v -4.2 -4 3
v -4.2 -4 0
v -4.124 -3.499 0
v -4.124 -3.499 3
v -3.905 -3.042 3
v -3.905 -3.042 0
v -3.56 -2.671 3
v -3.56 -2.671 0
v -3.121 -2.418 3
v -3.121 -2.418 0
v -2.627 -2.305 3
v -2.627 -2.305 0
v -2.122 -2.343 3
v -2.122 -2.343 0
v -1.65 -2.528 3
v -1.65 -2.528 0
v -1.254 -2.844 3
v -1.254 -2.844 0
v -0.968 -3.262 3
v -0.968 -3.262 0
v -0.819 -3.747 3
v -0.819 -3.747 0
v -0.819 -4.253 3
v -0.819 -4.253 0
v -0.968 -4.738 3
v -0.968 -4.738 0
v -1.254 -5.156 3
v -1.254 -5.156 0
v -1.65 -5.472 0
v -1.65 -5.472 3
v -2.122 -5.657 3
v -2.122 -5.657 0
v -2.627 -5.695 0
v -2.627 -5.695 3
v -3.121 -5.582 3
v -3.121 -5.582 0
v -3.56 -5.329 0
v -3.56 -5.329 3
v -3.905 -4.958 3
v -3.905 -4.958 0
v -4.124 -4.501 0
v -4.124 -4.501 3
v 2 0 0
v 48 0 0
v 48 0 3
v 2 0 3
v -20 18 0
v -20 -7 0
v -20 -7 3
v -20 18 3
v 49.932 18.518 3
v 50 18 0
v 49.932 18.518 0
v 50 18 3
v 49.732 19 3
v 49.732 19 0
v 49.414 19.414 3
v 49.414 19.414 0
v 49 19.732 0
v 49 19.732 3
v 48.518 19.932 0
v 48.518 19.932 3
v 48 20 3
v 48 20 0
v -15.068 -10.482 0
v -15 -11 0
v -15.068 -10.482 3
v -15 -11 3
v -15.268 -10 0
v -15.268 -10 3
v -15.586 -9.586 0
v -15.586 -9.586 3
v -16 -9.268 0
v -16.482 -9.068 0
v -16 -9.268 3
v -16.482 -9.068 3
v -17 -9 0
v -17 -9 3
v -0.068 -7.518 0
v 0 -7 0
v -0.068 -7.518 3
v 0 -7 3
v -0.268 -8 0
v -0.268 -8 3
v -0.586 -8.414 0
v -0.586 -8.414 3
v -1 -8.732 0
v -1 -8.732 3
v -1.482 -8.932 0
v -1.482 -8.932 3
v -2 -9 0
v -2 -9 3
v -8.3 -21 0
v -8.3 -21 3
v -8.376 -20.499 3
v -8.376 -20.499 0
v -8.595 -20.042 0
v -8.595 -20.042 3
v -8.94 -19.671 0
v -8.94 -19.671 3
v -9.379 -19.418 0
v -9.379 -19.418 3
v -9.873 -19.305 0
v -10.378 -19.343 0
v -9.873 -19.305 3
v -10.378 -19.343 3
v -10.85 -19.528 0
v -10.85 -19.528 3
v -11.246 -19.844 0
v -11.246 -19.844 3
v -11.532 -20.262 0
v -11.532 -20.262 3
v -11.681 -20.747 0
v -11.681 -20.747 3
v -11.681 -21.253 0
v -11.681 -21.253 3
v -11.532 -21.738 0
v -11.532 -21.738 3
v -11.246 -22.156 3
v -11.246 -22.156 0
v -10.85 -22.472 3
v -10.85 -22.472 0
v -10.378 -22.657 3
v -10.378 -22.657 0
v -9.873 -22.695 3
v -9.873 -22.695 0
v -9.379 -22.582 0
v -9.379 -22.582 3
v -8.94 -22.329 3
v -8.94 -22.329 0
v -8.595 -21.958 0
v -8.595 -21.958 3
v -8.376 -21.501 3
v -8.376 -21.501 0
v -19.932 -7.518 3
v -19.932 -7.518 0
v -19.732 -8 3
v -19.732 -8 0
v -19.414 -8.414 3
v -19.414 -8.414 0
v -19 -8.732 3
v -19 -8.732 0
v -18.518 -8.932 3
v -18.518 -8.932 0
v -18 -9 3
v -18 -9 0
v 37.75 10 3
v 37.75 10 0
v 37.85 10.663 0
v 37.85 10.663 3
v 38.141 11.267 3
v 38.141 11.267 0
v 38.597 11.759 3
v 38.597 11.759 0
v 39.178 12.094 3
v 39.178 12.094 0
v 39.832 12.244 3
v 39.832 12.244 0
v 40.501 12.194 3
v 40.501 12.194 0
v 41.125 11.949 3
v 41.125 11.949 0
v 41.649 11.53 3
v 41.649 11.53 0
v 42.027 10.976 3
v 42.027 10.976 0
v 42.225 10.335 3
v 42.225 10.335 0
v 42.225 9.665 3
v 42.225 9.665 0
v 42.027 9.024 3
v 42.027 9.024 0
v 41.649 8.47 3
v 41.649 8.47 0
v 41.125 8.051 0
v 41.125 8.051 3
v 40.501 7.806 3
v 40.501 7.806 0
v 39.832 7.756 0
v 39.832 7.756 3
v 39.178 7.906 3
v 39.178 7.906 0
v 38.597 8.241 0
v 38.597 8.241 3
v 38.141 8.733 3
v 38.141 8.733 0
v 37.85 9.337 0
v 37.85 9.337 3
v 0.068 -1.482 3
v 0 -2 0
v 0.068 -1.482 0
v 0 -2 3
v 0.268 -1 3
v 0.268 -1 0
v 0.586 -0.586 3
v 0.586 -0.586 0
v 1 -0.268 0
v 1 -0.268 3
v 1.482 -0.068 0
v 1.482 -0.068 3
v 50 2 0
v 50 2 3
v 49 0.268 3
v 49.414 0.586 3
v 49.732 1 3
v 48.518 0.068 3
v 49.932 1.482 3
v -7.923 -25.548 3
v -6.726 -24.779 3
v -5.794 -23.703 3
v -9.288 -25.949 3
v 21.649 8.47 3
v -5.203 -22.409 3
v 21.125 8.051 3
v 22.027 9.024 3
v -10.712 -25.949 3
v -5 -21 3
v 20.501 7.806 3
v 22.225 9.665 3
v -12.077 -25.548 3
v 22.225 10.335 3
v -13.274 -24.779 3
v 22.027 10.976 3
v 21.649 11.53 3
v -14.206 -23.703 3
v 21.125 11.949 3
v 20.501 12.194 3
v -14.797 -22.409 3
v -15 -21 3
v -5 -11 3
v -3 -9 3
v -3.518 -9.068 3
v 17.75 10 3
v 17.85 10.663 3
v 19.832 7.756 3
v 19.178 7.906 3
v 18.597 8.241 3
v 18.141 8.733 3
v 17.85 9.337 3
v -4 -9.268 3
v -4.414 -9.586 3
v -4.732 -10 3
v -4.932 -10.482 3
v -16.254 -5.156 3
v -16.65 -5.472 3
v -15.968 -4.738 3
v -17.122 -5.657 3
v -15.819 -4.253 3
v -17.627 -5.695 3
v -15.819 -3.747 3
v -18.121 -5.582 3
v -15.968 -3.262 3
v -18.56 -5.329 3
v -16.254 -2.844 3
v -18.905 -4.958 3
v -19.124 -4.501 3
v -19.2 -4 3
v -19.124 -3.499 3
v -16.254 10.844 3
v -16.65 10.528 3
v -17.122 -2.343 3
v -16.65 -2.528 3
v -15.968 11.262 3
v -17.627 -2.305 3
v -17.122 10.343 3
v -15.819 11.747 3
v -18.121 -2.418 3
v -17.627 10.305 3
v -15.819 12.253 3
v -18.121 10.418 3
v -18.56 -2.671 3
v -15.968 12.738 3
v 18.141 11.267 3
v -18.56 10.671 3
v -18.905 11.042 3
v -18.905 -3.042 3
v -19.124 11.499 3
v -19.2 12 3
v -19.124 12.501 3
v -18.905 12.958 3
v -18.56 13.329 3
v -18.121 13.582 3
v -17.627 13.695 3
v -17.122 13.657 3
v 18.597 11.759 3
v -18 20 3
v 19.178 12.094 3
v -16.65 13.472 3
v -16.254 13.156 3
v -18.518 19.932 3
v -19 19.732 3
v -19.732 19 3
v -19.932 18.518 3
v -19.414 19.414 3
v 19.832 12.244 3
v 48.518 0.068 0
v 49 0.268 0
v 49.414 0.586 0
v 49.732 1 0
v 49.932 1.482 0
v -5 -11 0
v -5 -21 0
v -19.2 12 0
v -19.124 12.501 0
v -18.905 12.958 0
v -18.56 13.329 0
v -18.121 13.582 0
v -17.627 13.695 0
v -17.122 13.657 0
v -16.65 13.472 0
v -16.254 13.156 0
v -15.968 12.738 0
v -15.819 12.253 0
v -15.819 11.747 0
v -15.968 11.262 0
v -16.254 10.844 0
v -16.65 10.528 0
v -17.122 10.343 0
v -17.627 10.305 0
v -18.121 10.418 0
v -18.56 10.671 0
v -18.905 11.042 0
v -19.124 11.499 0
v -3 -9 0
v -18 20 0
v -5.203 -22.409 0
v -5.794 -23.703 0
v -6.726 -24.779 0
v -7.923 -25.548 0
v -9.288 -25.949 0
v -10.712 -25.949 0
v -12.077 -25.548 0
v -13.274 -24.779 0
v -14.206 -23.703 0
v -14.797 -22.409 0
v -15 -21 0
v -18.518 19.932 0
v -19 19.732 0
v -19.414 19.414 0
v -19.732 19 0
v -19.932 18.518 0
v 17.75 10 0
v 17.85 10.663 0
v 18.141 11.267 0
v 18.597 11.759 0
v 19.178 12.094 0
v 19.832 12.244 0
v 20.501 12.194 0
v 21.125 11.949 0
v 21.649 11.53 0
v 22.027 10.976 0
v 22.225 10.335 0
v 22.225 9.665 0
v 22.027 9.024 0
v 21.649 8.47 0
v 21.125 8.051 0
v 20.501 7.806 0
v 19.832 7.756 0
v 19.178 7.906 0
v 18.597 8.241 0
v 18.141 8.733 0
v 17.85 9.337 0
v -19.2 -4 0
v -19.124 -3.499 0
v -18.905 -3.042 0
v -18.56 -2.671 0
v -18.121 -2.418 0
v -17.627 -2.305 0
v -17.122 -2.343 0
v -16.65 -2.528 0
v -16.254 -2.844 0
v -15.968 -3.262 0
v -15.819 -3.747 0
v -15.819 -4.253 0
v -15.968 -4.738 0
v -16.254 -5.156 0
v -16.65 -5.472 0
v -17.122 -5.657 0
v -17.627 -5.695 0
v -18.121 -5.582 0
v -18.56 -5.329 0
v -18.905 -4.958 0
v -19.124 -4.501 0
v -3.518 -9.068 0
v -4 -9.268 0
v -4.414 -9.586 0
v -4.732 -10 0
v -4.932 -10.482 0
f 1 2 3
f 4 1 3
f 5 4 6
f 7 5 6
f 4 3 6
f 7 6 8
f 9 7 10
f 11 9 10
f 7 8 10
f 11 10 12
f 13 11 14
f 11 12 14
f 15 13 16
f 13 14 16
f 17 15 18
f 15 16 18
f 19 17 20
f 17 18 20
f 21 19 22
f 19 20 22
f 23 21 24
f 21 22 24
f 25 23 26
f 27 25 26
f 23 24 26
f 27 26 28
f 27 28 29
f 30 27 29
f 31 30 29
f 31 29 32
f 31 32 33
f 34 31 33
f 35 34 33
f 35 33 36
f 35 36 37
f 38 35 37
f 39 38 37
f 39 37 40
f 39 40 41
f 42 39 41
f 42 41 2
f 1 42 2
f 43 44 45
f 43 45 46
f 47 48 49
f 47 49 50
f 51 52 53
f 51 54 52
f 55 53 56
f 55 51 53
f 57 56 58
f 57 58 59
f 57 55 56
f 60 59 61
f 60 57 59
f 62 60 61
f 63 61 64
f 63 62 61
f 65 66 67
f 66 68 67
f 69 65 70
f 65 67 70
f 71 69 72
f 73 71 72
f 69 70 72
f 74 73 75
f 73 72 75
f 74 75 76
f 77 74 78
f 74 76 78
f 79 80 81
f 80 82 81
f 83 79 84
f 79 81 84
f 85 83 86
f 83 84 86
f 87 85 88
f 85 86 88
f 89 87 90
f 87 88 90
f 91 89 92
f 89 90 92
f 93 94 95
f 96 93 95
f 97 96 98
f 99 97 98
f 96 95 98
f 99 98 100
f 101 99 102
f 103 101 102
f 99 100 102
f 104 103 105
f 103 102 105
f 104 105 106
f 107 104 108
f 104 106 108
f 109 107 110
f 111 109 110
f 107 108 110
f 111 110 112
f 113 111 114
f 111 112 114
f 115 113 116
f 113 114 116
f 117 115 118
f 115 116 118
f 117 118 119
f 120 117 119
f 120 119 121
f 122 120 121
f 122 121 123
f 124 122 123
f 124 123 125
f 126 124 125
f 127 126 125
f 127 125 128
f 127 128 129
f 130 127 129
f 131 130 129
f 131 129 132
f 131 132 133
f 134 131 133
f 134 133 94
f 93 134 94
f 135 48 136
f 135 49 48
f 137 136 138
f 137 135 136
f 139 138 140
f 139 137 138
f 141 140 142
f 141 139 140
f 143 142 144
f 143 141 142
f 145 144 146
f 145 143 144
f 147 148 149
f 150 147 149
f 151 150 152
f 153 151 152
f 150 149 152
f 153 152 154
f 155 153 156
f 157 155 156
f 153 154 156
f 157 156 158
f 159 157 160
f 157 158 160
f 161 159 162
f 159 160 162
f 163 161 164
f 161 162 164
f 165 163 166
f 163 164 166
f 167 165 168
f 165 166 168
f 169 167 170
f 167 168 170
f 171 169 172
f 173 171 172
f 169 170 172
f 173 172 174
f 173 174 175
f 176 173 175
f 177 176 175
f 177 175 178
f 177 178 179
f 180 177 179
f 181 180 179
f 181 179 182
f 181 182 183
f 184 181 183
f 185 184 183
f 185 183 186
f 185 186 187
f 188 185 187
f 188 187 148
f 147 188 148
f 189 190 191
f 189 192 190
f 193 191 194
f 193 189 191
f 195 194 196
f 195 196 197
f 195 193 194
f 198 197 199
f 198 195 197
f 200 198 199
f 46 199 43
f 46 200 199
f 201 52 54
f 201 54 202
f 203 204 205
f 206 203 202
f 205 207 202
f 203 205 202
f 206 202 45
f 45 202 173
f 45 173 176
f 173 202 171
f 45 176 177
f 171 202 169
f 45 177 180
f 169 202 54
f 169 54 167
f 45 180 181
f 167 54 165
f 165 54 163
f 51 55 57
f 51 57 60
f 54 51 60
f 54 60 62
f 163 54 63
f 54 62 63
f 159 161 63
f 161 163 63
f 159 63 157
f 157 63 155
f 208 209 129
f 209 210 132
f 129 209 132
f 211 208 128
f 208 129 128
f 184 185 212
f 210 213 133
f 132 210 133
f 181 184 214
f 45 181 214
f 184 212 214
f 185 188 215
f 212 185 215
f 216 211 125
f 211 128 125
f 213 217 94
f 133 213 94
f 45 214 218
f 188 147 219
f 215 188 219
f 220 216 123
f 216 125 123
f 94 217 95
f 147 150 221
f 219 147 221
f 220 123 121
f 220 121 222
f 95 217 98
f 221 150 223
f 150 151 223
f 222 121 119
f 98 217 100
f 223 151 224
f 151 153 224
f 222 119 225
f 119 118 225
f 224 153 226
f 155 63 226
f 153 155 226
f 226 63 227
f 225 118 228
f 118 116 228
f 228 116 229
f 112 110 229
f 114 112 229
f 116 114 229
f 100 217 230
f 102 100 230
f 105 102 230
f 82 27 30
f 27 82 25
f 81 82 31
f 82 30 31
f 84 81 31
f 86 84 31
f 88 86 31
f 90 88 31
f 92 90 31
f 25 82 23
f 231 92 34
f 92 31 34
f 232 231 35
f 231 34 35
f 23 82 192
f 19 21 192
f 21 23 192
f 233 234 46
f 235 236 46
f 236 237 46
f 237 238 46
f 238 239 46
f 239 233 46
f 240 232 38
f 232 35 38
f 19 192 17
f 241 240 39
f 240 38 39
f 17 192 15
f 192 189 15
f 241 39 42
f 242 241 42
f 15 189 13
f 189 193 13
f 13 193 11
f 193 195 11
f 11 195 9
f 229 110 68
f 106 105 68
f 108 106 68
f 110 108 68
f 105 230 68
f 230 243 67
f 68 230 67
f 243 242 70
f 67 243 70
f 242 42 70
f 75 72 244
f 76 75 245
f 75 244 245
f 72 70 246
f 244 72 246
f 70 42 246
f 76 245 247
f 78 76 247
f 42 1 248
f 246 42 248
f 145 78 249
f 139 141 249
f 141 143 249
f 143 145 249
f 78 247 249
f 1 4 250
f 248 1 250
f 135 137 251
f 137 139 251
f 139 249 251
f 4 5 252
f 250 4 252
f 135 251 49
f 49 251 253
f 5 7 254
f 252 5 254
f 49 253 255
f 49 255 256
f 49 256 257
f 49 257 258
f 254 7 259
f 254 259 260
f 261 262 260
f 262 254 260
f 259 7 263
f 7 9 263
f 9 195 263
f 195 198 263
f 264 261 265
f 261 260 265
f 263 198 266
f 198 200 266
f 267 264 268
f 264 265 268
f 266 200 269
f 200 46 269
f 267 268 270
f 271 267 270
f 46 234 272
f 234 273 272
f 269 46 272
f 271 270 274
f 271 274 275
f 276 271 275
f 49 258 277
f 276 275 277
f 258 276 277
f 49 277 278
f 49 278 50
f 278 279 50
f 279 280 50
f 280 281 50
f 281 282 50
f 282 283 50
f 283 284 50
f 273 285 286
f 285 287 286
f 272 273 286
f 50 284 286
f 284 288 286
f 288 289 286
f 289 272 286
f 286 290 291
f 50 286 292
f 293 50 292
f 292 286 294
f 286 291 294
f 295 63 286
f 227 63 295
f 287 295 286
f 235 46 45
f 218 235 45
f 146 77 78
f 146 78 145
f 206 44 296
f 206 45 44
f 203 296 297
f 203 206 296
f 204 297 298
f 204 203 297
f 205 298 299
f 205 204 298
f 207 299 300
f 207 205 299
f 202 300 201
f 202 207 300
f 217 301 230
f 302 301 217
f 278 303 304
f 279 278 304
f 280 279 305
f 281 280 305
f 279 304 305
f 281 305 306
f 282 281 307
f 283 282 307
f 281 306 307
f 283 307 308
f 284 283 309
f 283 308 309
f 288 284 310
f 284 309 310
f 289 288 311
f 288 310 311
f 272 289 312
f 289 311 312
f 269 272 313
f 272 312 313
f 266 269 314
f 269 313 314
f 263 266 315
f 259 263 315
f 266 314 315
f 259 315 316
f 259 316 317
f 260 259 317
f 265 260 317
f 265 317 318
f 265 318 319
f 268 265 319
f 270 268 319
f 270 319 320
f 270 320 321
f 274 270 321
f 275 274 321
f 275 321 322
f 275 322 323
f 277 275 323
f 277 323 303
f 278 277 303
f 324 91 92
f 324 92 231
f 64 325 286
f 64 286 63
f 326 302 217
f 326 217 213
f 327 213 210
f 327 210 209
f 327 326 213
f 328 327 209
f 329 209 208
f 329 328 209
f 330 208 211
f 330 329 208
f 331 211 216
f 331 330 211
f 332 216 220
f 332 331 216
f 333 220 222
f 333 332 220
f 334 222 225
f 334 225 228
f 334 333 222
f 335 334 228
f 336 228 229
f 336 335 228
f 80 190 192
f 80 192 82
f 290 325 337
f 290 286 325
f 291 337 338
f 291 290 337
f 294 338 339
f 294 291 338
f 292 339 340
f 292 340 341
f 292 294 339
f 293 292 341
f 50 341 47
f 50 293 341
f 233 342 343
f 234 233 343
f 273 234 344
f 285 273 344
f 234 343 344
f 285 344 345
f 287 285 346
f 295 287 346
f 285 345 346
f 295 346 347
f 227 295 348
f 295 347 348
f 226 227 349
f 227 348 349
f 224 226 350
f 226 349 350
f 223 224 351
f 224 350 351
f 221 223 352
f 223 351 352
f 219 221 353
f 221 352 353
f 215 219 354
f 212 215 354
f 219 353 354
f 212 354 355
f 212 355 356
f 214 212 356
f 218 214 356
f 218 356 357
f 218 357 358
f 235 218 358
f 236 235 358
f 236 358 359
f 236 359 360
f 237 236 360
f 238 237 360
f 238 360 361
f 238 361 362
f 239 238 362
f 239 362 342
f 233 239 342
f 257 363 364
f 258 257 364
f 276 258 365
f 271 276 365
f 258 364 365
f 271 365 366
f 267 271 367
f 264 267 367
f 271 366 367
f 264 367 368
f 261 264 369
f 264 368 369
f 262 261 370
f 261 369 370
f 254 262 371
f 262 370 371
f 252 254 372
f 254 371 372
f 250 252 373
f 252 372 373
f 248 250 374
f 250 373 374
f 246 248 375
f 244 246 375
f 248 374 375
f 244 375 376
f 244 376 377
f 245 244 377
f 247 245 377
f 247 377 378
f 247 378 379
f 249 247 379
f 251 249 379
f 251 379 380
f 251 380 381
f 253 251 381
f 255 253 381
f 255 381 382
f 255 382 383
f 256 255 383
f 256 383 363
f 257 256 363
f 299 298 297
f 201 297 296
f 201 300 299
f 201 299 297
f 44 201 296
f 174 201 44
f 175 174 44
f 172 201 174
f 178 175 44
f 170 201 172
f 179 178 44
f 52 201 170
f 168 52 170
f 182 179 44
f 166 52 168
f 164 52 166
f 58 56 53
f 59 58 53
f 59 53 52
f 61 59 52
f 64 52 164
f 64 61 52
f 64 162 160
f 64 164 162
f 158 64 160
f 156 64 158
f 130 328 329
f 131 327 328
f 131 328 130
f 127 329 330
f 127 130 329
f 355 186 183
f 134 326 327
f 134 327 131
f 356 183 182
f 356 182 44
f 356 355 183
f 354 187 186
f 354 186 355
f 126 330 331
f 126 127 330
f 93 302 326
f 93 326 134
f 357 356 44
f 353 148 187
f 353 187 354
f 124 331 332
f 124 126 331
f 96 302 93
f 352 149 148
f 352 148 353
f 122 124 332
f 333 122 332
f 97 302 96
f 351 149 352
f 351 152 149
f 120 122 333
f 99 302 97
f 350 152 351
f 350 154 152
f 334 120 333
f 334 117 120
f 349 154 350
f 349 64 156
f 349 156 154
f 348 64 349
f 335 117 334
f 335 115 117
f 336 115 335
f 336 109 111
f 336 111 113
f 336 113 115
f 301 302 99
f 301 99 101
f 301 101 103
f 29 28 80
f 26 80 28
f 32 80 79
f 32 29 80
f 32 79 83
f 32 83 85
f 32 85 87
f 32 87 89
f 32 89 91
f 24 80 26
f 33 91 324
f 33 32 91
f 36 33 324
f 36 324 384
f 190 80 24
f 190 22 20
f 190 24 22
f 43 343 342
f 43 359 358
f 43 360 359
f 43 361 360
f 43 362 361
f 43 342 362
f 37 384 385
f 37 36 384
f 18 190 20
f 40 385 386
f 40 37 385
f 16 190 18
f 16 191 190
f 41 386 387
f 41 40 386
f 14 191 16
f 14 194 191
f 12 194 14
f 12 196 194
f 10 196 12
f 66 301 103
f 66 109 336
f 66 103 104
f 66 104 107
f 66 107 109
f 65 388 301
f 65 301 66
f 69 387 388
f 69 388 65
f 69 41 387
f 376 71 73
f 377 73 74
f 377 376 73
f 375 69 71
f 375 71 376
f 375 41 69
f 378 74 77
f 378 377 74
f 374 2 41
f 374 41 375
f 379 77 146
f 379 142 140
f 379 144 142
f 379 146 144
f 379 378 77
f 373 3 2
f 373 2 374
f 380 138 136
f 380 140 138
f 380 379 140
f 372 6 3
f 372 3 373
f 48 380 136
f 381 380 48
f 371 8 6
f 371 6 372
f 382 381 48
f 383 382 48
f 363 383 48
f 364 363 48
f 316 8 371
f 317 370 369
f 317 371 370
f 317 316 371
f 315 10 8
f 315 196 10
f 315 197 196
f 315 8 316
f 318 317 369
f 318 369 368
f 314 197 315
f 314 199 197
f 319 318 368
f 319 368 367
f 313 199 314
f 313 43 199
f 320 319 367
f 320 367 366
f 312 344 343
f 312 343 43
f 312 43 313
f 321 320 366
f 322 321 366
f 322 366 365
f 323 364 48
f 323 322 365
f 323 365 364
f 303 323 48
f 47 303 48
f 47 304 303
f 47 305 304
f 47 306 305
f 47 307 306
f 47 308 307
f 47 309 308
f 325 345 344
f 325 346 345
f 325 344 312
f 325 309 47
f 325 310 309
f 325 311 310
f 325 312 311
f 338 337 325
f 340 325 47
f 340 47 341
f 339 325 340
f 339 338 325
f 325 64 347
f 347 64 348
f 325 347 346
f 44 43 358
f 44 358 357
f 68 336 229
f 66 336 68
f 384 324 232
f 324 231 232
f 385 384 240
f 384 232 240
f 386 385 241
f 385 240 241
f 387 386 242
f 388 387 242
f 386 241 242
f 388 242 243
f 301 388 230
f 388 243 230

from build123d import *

# Parameters (mm, degrees)
AUFSATZ_LINEAR_AUSTRAGEN1_DEPTH = 3
SKIZZE2_R                       = 1.7
SCHNITT_LINEAR_AUSTRAGEN1_DEPTH = 4
DURCHGANGSLOCH_F_R_M41_D        = 4.5
DURCHGANGSLOCH_F_R_M31_D        = 3.4
VERRUNDUNG1_R                   = 2


with BuildPart() as part:
    # Skizze1 → Aufsatz-Linear austragen1 (new body)
    with BuildSketch(Plane.XY):
        with BuildLine():
            Line((0, 0), (0, -9))
            Line((0, -9), (-5, -9))
            Line((-5, -9), (-5, -21))
            ThreePointArc((-5, -21), (-10, -26), (-15, -21))
            Line((-15, -21), (-15, -9))
            Line((-15, -9), (-20, -9))
            Line((-20, -9), (-20, 20))
            Line((-20, 20), (50, 20))
            Line((50, 20), (50, 0))
            Line((50, 0), (0, 0))
        make_face()
    extrude(amount=AUFSATZ_LINEAR_AUSTRAGEN1_DEPTH)

    # Skizze2 → Schnitt-Linear austragen1 (cut, through all)
    with BuildSketch(Plane.XY.offset(3)):
        with Locations((-10, -21)):
            Circle(SKIZZE2_R)
    extrude(amount=-SCHNITT_LINEAR_AUSTRAGEN1_DEPTH, mode=Mode.SUBTRACT)

    # Durchgangsloch für M41 (through all)
    with Locations(Plane.XY.offset(3)):
        with Locations((20, 10), (40, 10)):
            Hole(DURCHGANGSLOCH_F_R_M41_D / 2)

    # Durchgangsloch für M31 (through all)
    with Locations(Plane.XY.offset(3)):
        with Locations((-17.5, 12), (-2.5, -4), (-17.5, -4)):
            Hole(DURCHGANGSLOCH_F_R_M31_D / 2)

    # Verrundung1
    verrundung1_edges = [part.edges().sort_by_distance(p)[0] for p in [
        (0, 0, 1.5),
        (0, -9, 1.5),
        (-5, -9, 1.5),
        (-15, -9, 1.5),
        (-20, -9, 1.5),
        (-20, 20, 1.5),
        (50, 20, 1.5),
        (50, 0, 1.5),
    ]]
    fillet(verrundung1_edges, radius=VERRUNDUNG1_R)


solid = part.part
